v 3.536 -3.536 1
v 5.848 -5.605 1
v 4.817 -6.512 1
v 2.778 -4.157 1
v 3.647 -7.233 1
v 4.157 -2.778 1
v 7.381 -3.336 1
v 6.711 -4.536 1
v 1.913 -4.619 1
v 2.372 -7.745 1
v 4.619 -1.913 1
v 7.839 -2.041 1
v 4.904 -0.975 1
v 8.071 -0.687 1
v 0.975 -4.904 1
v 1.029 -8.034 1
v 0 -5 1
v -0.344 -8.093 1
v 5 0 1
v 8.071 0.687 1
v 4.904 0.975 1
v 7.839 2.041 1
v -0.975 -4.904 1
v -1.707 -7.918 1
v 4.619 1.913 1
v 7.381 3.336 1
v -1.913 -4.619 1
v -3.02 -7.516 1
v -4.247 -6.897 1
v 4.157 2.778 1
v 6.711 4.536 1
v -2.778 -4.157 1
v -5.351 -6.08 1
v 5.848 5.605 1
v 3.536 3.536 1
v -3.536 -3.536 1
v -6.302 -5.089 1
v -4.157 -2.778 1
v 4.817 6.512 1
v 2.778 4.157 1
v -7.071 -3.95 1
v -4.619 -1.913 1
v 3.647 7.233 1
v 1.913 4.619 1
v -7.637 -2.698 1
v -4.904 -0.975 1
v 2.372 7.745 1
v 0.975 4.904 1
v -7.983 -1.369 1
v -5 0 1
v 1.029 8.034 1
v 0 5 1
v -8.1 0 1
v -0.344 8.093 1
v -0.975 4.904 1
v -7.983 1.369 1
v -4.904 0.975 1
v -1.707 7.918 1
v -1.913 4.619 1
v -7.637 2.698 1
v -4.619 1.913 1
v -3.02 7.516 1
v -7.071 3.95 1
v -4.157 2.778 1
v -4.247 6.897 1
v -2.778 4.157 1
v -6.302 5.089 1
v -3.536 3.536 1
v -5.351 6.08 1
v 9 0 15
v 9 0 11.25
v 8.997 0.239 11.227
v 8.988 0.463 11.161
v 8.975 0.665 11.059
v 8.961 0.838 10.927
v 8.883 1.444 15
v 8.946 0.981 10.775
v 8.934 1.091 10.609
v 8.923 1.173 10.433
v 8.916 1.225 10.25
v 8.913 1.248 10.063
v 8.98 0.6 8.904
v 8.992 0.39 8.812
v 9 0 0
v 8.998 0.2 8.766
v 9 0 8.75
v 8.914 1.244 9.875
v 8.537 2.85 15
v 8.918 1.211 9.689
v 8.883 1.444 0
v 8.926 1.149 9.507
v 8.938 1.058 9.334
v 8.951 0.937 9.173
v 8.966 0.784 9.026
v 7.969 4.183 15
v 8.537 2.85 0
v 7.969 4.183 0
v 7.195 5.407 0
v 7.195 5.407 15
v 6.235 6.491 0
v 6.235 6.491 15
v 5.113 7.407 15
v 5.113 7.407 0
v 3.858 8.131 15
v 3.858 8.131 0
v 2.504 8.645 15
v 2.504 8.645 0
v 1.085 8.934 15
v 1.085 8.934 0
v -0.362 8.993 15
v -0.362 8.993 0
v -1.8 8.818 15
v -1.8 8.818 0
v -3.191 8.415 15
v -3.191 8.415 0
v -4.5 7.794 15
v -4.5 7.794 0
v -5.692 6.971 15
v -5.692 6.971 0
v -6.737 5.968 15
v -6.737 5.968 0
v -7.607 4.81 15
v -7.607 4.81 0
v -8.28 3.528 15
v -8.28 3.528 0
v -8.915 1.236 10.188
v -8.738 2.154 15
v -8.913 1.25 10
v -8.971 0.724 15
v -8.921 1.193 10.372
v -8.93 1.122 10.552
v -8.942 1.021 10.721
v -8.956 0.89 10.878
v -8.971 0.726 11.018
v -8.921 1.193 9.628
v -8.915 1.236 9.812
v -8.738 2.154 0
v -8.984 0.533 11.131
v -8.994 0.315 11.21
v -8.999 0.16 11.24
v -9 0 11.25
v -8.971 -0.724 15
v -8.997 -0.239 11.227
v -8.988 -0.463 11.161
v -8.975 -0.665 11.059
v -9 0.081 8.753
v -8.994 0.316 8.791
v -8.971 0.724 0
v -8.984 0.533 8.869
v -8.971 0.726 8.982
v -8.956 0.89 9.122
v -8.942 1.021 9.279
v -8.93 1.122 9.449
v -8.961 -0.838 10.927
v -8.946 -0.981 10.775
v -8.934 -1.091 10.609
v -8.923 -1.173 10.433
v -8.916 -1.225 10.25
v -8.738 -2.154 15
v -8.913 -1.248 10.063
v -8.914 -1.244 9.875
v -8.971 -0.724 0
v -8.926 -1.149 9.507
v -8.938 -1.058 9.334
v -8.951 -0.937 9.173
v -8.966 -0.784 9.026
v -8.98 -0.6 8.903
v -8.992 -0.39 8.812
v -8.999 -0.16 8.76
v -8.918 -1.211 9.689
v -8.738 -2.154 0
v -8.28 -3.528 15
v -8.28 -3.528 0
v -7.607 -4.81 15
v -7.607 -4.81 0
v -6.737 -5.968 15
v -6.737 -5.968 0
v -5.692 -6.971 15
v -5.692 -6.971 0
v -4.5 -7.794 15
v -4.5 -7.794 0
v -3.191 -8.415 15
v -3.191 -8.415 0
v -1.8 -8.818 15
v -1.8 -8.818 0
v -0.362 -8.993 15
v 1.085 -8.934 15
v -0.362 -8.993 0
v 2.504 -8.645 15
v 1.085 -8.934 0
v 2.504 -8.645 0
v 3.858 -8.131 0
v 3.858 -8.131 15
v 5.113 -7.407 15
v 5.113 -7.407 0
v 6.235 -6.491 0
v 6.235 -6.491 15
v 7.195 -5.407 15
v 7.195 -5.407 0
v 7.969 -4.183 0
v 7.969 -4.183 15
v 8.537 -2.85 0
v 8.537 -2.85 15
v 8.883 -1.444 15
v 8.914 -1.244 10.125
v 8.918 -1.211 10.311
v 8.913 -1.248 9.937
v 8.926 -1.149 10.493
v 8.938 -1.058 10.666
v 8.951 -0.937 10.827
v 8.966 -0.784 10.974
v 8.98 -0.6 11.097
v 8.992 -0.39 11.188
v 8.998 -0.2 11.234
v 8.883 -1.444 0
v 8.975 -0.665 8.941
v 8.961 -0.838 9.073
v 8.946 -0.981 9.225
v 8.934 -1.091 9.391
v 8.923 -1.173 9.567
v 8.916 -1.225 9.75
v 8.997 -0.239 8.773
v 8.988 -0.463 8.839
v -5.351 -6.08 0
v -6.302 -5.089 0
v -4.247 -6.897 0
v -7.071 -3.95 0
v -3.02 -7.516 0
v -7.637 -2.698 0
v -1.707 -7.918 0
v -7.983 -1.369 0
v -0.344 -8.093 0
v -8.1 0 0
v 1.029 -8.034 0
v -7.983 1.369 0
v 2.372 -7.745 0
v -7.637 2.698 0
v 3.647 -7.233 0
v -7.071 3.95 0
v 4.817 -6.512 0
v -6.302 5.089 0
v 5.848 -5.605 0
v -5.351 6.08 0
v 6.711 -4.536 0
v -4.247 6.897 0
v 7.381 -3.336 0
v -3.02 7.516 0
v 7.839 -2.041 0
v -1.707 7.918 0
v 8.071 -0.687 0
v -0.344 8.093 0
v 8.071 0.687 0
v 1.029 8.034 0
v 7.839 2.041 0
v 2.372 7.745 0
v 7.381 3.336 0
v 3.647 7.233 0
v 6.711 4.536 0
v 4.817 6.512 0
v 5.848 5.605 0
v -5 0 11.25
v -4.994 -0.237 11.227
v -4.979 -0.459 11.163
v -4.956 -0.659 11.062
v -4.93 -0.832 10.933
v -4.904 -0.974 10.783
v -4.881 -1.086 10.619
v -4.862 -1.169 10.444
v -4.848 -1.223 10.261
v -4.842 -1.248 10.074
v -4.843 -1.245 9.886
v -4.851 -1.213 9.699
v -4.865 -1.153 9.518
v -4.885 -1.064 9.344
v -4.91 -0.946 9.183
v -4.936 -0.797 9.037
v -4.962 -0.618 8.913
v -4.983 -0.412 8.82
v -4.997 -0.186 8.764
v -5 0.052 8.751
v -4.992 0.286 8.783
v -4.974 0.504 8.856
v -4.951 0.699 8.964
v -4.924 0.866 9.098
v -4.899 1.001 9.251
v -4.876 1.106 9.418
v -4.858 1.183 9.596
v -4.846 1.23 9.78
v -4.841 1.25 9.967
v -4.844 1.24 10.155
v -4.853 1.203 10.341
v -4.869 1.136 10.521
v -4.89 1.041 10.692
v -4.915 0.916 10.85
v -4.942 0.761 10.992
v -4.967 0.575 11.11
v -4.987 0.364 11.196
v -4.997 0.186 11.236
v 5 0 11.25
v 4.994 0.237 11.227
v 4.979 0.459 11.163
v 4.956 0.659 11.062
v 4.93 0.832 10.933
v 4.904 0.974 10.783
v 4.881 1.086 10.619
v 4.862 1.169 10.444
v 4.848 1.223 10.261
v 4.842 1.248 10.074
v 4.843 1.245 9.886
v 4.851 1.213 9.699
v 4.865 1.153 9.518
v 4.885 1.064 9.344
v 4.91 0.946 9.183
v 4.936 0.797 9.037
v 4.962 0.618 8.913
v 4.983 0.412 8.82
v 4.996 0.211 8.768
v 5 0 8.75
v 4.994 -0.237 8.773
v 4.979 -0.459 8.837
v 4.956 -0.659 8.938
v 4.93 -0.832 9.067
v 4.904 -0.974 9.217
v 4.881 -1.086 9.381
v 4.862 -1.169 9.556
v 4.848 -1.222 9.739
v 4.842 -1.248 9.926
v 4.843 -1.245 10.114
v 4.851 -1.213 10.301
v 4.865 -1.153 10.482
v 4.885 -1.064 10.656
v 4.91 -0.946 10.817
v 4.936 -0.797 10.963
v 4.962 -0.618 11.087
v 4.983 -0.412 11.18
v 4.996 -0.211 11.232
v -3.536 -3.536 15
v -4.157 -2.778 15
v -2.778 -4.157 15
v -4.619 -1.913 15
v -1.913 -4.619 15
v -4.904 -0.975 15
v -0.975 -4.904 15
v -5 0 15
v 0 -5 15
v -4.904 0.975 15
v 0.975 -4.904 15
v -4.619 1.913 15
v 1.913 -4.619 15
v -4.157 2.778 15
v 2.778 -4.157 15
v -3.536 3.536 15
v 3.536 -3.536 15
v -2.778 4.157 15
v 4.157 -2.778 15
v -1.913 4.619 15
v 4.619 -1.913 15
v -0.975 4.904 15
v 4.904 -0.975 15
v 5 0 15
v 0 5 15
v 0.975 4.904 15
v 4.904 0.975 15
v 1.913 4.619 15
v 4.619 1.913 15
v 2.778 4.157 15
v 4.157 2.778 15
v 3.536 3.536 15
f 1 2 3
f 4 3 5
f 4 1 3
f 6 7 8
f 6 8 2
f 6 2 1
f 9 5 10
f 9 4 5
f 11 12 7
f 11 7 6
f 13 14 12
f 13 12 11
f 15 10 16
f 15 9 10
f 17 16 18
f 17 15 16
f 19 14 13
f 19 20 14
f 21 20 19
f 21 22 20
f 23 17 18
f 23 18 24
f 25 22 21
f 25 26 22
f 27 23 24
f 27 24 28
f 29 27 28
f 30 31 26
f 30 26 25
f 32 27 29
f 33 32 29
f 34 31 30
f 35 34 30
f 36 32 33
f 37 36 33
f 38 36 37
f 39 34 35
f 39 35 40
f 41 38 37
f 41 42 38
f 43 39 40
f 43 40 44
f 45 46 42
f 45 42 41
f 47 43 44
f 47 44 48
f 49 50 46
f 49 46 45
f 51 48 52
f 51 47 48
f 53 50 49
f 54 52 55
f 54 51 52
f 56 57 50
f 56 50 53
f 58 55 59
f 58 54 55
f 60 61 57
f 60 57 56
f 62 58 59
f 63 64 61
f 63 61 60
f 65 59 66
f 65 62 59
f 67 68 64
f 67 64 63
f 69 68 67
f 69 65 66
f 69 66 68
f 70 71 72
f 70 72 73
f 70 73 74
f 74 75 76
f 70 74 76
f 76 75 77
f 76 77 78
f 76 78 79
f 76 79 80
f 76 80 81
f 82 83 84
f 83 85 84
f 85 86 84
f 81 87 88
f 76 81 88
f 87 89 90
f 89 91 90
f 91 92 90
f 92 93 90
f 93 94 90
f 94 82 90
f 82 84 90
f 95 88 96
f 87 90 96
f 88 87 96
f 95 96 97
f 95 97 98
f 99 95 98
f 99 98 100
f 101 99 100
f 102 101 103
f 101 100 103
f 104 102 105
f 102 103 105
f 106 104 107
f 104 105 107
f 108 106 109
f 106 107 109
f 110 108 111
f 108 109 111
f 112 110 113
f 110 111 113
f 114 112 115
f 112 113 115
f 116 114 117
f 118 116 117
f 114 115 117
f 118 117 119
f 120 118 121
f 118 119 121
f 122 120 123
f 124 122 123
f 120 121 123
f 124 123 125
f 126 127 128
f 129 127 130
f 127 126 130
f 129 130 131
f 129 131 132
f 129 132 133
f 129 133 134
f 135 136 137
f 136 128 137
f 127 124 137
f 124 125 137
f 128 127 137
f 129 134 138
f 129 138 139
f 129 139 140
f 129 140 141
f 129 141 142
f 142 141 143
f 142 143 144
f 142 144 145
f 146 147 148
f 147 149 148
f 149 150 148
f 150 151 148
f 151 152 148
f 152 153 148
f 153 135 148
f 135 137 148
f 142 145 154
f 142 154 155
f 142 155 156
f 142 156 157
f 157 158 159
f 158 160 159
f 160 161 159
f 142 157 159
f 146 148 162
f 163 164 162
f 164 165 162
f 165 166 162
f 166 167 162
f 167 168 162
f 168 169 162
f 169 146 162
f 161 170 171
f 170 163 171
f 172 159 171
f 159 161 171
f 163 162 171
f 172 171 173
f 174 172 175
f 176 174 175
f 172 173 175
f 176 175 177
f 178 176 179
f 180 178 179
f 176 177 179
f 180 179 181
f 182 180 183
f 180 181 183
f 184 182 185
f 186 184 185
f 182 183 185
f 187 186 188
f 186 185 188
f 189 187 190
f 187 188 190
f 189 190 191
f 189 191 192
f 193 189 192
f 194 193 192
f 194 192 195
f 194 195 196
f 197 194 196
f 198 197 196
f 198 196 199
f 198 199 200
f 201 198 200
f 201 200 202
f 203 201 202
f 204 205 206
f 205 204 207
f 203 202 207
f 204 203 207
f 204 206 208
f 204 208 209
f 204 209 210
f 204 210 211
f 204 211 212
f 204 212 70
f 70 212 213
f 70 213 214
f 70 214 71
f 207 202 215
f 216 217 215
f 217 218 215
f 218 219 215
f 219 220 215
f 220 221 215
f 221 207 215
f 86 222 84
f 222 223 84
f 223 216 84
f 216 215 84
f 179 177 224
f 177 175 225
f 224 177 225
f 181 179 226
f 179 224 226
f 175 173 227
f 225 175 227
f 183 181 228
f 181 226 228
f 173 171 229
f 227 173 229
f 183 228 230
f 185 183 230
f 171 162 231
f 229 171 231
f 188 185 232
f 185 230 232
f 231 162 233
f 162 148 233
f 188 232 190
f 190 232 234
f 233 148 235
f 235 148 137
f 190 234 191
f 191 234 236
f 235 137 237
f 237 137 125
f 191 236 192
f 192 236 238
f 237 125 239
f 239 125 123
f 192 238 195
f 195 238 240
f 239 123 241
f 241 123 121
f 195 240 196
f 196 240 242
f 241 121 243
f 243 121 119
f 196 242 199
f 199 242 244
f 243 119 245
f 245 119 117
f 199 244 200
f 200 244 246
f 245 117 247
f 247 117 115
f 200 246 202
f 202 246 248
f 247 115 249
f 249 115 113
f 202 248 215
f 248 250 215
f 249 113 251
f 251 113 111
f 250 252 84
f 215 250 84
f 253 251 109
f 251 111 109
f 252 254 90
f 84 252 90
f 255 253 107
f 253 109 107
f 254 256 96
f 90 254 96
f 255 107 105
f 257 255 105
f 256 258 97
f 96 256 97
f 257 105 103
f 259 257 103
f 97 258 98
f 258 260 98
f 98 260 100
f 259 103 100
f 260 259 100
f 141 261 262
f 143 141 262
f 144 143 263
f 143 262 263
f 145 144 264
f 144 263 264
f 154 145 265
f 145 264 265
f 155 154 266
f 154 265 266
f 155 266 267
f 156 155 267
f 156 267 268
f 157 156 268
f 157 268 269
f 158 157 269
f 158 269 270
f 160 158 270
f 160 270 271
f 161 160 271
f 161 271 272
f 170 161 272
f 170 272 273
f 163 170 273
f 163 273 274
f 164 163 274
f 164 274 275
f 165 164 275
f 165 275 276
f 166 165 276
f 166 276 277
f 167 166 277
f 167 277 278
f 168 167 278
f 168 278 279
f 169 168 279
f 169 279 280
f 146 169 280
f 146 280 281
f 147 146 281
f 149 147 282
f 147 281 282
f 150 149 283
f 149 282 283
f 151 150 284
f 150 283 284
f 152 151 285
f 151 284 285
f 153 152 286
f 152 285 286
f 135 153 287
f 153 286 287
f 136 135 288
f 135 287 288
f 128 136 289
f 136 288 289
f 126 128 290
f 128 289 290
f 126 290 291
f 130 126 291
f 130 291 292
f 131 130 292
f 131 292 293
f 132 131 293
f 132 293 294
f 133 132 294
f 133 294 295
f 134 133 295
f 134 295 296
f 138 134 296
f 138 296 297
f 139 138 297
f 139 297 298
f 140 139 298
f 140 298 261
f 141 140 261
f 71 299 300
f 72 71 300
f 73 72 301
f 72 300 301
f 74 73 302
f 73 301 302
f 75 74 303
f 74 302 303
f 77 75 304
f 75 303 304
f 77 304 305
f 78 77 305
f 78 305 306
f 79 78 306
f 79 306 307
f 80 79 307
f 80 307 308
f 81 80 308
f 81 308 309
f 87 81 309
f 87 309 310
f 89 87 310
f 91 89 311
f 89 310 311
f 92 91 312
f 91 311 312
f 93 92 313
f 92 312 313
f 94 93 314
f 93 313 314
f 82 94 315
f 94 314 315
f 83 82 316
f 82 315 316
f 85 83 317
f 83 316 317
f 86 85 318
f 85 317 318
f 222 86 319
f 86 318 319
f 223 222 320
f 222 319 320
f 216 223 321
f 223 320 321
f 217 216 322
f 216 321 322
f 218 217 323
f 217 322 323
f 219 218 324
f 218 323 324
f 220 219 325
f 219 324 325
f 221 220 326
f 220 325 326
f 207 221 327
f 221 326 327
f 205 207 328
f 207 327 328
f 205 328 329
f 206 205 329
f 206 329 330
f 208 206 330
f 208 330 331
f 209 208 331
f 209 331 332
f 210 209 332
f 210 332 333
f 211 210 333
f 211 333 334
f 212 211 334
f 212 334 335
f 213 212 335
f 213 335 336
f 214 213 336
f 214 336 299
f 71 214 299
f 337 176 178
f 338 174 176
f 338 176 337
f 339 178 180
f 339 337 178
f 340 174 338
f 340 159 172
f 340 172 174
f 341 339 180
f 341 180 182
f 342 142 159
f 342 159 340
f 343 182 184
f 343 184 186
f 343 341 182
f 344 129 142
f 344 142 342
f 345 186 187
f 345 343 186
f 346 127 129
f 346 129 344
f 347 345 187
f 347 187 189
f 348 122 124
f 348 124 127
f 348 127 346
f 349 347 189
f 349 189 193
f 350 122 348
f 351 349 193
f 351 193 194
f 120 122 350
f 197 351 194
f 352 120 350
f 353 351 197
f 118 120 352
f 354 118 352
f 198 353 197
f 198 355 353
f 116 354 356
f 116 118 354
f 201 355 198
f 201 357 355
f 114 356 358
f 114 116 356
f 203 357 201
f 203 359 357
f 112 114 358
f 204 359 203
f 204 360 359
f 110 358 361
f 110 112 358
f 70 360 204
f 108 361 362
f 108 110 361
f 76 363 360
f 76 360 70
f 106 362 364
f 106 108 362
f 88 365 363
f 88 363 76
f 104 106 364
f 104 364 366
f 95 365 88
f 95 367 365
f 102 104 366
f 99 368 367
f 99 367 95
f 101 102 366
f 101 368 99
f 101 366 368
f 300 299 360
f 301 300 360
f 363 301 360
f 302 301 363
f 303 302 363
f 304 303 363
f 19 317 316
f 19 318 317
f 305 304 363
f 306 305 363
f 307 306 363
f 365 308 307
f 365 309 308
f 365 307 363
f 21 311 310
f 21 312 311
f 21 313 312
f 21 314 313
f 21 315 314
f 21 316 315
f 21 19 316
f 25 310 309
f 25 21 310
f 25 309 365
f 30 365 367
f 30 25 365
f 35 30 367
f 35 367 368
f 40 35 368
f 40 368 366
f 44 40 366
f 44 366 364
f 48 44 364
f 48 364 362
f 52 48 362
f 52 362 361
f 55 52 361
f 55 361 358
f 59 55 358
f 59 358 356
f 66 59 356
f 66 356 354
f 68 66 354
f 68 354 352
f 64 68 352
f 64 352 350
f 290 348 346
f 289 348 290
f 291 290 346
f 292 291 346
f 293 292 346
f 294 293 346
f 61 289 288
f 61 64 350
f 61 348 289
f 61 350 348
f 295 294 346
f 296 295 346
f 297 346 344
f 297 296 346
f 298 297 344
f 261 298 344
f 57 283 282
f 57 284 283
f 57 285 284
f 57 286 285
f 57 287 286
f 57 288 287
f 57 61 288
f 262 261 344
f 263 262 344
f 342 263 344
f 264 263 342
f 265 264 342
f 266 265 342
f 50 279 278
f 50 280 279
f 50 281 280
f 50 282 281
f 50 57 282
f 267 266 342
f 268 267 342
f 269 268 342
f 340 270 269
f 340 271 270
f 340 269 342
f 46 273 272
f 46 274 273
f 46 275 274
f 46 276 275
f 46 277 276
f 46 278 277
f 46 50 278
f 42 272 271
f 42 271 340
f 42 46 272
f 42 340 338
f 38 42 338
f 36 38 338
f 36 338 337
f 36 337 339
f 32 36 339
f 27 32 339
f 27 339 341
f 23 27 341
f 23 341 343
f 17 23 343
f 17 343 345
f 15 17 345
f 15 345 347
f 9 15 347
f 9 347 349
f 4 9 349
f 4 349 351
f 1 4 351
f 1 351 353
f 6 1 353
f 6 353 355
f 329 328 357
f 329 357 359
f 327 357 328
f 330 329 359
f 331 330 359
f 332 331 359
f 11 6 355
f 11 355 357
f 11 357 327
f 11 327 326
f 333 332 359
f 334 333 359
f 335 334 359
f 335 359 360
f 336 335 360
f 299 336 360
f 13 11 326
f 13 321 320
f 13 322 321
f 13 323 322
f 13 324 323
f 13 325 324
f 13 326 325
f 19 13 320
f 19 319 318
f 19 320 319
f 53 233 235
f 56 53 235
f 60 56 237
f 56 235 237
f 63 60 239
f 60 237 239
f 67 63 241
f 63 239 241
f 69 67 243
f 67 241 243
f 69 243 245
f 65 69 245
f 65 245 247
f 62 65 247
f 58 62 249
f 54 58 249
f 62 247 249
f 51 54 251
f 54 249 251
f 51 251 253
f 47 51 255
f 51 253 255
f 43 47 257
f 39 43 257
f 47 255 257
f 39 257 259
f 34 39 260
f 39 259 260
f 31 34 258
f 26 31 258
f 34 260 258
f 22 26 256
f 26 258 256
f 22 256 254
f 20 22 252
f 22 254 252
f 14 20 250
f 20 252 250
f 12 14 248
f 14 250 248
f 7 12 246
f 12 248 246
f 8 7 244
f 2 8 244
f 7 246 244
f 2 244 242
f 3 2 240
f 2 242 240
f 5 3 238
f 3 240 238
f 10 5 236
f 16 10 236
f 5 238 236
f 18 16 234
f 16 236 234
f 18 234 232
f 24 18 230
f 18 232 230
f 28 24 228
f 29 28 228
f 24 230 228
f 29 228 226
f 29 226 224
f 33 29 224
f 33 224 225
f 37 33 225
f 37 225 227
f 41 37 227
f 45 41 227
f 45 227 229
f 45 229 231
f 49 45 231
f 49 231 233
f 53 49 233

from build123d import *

# Parameters (mm, degrees)
ESQUISSE1_R             = 9
ESQUISSE1_R_2           = 5
BOSS_EXTRU_1_DEPTH      = 15
TROU_TARAUD_M31_D       = 2.5
TROU_TARAUD_M31_DEPTH   = 8.5
TROU_TARAUD_M31_TIP     = 0.751075774
TROU_TARAUD_M32_D       = 2.5
TROU_TARAUD_M32_DEPTH   = 8.5
TROU_TARAUD_M32_TIP     = 0.751075774
ESQUISSE9_R             = 8.1
ENL_V_MAT_EXTRU_1_DEPTH = 1


with BuildPart() as part:
    # Esquisse1 → Boss.-Extru.1 (new body)
    with BuildSketch(Plane.XY):
        Circle(ESQUISSE1_R)
        Circle(ESQUISSE1_R_2, mode=Mode.SUBTRACT)
    extrude(amount=BOSS_EXTRU_1_DEPTH)

    # Trou taraudé M31
    with Locations(Plane(origin=(9, 0, 0), x_dir=(0, 0, -1), z_dir=(1, 0, 0))):
        with Locations((-10, 0)):
            Hole(TROU_TARAUD_M31_D / 2, depth=TROU_TARAUD_M31_DEPTH)
            with Locations((0, 0, -(TROU_TARAUD_M31_DEPTH + TROU_TARAUD_M31_TIP / 2))):  # 118° drill point
                Cone(0, TROU_TARAUD_M31_D / 2, TROU_TARAUD_M31_TIP, mode=Mode.SUBTRACT)

    # Trou taraudé M32
    with Locations(Plane(origin=(-9, 0, 0), x_dir=(0, 0, -1), z_dir=(-1, 0, 0))):
        with Locations((-10, 0)):
            Hole(TROU_TARAUD_M32_D / 2, depth=TROU_TARAUD_M32_DEPTH)
            with Locations((0, 0, -(TROU_TARAUD_M32_DEPTH + TROU_TARAUD_M32_TIP / 2))):  # 118° drill point
                Cone(0, TROU_TARAUD_M32_D / 2, TROU_TARAUD_M32_TIP, mode=Mode.SUBTRACT)

    # Esquisse9 → Enlèv. mat.-Extru.1 (cut)
    with BuildSketch(Plane(origin=(0, 0, 0), x_dir=(-1, 0, 0), z_dir=(0, 0, -1))):
        Circle(ESQUISSE9_R)
    extrude(amount=-ENL_V_MAT_EXTRU_1_DEPTH, mode=Mode.SUBTRACT)


solid = part.part
